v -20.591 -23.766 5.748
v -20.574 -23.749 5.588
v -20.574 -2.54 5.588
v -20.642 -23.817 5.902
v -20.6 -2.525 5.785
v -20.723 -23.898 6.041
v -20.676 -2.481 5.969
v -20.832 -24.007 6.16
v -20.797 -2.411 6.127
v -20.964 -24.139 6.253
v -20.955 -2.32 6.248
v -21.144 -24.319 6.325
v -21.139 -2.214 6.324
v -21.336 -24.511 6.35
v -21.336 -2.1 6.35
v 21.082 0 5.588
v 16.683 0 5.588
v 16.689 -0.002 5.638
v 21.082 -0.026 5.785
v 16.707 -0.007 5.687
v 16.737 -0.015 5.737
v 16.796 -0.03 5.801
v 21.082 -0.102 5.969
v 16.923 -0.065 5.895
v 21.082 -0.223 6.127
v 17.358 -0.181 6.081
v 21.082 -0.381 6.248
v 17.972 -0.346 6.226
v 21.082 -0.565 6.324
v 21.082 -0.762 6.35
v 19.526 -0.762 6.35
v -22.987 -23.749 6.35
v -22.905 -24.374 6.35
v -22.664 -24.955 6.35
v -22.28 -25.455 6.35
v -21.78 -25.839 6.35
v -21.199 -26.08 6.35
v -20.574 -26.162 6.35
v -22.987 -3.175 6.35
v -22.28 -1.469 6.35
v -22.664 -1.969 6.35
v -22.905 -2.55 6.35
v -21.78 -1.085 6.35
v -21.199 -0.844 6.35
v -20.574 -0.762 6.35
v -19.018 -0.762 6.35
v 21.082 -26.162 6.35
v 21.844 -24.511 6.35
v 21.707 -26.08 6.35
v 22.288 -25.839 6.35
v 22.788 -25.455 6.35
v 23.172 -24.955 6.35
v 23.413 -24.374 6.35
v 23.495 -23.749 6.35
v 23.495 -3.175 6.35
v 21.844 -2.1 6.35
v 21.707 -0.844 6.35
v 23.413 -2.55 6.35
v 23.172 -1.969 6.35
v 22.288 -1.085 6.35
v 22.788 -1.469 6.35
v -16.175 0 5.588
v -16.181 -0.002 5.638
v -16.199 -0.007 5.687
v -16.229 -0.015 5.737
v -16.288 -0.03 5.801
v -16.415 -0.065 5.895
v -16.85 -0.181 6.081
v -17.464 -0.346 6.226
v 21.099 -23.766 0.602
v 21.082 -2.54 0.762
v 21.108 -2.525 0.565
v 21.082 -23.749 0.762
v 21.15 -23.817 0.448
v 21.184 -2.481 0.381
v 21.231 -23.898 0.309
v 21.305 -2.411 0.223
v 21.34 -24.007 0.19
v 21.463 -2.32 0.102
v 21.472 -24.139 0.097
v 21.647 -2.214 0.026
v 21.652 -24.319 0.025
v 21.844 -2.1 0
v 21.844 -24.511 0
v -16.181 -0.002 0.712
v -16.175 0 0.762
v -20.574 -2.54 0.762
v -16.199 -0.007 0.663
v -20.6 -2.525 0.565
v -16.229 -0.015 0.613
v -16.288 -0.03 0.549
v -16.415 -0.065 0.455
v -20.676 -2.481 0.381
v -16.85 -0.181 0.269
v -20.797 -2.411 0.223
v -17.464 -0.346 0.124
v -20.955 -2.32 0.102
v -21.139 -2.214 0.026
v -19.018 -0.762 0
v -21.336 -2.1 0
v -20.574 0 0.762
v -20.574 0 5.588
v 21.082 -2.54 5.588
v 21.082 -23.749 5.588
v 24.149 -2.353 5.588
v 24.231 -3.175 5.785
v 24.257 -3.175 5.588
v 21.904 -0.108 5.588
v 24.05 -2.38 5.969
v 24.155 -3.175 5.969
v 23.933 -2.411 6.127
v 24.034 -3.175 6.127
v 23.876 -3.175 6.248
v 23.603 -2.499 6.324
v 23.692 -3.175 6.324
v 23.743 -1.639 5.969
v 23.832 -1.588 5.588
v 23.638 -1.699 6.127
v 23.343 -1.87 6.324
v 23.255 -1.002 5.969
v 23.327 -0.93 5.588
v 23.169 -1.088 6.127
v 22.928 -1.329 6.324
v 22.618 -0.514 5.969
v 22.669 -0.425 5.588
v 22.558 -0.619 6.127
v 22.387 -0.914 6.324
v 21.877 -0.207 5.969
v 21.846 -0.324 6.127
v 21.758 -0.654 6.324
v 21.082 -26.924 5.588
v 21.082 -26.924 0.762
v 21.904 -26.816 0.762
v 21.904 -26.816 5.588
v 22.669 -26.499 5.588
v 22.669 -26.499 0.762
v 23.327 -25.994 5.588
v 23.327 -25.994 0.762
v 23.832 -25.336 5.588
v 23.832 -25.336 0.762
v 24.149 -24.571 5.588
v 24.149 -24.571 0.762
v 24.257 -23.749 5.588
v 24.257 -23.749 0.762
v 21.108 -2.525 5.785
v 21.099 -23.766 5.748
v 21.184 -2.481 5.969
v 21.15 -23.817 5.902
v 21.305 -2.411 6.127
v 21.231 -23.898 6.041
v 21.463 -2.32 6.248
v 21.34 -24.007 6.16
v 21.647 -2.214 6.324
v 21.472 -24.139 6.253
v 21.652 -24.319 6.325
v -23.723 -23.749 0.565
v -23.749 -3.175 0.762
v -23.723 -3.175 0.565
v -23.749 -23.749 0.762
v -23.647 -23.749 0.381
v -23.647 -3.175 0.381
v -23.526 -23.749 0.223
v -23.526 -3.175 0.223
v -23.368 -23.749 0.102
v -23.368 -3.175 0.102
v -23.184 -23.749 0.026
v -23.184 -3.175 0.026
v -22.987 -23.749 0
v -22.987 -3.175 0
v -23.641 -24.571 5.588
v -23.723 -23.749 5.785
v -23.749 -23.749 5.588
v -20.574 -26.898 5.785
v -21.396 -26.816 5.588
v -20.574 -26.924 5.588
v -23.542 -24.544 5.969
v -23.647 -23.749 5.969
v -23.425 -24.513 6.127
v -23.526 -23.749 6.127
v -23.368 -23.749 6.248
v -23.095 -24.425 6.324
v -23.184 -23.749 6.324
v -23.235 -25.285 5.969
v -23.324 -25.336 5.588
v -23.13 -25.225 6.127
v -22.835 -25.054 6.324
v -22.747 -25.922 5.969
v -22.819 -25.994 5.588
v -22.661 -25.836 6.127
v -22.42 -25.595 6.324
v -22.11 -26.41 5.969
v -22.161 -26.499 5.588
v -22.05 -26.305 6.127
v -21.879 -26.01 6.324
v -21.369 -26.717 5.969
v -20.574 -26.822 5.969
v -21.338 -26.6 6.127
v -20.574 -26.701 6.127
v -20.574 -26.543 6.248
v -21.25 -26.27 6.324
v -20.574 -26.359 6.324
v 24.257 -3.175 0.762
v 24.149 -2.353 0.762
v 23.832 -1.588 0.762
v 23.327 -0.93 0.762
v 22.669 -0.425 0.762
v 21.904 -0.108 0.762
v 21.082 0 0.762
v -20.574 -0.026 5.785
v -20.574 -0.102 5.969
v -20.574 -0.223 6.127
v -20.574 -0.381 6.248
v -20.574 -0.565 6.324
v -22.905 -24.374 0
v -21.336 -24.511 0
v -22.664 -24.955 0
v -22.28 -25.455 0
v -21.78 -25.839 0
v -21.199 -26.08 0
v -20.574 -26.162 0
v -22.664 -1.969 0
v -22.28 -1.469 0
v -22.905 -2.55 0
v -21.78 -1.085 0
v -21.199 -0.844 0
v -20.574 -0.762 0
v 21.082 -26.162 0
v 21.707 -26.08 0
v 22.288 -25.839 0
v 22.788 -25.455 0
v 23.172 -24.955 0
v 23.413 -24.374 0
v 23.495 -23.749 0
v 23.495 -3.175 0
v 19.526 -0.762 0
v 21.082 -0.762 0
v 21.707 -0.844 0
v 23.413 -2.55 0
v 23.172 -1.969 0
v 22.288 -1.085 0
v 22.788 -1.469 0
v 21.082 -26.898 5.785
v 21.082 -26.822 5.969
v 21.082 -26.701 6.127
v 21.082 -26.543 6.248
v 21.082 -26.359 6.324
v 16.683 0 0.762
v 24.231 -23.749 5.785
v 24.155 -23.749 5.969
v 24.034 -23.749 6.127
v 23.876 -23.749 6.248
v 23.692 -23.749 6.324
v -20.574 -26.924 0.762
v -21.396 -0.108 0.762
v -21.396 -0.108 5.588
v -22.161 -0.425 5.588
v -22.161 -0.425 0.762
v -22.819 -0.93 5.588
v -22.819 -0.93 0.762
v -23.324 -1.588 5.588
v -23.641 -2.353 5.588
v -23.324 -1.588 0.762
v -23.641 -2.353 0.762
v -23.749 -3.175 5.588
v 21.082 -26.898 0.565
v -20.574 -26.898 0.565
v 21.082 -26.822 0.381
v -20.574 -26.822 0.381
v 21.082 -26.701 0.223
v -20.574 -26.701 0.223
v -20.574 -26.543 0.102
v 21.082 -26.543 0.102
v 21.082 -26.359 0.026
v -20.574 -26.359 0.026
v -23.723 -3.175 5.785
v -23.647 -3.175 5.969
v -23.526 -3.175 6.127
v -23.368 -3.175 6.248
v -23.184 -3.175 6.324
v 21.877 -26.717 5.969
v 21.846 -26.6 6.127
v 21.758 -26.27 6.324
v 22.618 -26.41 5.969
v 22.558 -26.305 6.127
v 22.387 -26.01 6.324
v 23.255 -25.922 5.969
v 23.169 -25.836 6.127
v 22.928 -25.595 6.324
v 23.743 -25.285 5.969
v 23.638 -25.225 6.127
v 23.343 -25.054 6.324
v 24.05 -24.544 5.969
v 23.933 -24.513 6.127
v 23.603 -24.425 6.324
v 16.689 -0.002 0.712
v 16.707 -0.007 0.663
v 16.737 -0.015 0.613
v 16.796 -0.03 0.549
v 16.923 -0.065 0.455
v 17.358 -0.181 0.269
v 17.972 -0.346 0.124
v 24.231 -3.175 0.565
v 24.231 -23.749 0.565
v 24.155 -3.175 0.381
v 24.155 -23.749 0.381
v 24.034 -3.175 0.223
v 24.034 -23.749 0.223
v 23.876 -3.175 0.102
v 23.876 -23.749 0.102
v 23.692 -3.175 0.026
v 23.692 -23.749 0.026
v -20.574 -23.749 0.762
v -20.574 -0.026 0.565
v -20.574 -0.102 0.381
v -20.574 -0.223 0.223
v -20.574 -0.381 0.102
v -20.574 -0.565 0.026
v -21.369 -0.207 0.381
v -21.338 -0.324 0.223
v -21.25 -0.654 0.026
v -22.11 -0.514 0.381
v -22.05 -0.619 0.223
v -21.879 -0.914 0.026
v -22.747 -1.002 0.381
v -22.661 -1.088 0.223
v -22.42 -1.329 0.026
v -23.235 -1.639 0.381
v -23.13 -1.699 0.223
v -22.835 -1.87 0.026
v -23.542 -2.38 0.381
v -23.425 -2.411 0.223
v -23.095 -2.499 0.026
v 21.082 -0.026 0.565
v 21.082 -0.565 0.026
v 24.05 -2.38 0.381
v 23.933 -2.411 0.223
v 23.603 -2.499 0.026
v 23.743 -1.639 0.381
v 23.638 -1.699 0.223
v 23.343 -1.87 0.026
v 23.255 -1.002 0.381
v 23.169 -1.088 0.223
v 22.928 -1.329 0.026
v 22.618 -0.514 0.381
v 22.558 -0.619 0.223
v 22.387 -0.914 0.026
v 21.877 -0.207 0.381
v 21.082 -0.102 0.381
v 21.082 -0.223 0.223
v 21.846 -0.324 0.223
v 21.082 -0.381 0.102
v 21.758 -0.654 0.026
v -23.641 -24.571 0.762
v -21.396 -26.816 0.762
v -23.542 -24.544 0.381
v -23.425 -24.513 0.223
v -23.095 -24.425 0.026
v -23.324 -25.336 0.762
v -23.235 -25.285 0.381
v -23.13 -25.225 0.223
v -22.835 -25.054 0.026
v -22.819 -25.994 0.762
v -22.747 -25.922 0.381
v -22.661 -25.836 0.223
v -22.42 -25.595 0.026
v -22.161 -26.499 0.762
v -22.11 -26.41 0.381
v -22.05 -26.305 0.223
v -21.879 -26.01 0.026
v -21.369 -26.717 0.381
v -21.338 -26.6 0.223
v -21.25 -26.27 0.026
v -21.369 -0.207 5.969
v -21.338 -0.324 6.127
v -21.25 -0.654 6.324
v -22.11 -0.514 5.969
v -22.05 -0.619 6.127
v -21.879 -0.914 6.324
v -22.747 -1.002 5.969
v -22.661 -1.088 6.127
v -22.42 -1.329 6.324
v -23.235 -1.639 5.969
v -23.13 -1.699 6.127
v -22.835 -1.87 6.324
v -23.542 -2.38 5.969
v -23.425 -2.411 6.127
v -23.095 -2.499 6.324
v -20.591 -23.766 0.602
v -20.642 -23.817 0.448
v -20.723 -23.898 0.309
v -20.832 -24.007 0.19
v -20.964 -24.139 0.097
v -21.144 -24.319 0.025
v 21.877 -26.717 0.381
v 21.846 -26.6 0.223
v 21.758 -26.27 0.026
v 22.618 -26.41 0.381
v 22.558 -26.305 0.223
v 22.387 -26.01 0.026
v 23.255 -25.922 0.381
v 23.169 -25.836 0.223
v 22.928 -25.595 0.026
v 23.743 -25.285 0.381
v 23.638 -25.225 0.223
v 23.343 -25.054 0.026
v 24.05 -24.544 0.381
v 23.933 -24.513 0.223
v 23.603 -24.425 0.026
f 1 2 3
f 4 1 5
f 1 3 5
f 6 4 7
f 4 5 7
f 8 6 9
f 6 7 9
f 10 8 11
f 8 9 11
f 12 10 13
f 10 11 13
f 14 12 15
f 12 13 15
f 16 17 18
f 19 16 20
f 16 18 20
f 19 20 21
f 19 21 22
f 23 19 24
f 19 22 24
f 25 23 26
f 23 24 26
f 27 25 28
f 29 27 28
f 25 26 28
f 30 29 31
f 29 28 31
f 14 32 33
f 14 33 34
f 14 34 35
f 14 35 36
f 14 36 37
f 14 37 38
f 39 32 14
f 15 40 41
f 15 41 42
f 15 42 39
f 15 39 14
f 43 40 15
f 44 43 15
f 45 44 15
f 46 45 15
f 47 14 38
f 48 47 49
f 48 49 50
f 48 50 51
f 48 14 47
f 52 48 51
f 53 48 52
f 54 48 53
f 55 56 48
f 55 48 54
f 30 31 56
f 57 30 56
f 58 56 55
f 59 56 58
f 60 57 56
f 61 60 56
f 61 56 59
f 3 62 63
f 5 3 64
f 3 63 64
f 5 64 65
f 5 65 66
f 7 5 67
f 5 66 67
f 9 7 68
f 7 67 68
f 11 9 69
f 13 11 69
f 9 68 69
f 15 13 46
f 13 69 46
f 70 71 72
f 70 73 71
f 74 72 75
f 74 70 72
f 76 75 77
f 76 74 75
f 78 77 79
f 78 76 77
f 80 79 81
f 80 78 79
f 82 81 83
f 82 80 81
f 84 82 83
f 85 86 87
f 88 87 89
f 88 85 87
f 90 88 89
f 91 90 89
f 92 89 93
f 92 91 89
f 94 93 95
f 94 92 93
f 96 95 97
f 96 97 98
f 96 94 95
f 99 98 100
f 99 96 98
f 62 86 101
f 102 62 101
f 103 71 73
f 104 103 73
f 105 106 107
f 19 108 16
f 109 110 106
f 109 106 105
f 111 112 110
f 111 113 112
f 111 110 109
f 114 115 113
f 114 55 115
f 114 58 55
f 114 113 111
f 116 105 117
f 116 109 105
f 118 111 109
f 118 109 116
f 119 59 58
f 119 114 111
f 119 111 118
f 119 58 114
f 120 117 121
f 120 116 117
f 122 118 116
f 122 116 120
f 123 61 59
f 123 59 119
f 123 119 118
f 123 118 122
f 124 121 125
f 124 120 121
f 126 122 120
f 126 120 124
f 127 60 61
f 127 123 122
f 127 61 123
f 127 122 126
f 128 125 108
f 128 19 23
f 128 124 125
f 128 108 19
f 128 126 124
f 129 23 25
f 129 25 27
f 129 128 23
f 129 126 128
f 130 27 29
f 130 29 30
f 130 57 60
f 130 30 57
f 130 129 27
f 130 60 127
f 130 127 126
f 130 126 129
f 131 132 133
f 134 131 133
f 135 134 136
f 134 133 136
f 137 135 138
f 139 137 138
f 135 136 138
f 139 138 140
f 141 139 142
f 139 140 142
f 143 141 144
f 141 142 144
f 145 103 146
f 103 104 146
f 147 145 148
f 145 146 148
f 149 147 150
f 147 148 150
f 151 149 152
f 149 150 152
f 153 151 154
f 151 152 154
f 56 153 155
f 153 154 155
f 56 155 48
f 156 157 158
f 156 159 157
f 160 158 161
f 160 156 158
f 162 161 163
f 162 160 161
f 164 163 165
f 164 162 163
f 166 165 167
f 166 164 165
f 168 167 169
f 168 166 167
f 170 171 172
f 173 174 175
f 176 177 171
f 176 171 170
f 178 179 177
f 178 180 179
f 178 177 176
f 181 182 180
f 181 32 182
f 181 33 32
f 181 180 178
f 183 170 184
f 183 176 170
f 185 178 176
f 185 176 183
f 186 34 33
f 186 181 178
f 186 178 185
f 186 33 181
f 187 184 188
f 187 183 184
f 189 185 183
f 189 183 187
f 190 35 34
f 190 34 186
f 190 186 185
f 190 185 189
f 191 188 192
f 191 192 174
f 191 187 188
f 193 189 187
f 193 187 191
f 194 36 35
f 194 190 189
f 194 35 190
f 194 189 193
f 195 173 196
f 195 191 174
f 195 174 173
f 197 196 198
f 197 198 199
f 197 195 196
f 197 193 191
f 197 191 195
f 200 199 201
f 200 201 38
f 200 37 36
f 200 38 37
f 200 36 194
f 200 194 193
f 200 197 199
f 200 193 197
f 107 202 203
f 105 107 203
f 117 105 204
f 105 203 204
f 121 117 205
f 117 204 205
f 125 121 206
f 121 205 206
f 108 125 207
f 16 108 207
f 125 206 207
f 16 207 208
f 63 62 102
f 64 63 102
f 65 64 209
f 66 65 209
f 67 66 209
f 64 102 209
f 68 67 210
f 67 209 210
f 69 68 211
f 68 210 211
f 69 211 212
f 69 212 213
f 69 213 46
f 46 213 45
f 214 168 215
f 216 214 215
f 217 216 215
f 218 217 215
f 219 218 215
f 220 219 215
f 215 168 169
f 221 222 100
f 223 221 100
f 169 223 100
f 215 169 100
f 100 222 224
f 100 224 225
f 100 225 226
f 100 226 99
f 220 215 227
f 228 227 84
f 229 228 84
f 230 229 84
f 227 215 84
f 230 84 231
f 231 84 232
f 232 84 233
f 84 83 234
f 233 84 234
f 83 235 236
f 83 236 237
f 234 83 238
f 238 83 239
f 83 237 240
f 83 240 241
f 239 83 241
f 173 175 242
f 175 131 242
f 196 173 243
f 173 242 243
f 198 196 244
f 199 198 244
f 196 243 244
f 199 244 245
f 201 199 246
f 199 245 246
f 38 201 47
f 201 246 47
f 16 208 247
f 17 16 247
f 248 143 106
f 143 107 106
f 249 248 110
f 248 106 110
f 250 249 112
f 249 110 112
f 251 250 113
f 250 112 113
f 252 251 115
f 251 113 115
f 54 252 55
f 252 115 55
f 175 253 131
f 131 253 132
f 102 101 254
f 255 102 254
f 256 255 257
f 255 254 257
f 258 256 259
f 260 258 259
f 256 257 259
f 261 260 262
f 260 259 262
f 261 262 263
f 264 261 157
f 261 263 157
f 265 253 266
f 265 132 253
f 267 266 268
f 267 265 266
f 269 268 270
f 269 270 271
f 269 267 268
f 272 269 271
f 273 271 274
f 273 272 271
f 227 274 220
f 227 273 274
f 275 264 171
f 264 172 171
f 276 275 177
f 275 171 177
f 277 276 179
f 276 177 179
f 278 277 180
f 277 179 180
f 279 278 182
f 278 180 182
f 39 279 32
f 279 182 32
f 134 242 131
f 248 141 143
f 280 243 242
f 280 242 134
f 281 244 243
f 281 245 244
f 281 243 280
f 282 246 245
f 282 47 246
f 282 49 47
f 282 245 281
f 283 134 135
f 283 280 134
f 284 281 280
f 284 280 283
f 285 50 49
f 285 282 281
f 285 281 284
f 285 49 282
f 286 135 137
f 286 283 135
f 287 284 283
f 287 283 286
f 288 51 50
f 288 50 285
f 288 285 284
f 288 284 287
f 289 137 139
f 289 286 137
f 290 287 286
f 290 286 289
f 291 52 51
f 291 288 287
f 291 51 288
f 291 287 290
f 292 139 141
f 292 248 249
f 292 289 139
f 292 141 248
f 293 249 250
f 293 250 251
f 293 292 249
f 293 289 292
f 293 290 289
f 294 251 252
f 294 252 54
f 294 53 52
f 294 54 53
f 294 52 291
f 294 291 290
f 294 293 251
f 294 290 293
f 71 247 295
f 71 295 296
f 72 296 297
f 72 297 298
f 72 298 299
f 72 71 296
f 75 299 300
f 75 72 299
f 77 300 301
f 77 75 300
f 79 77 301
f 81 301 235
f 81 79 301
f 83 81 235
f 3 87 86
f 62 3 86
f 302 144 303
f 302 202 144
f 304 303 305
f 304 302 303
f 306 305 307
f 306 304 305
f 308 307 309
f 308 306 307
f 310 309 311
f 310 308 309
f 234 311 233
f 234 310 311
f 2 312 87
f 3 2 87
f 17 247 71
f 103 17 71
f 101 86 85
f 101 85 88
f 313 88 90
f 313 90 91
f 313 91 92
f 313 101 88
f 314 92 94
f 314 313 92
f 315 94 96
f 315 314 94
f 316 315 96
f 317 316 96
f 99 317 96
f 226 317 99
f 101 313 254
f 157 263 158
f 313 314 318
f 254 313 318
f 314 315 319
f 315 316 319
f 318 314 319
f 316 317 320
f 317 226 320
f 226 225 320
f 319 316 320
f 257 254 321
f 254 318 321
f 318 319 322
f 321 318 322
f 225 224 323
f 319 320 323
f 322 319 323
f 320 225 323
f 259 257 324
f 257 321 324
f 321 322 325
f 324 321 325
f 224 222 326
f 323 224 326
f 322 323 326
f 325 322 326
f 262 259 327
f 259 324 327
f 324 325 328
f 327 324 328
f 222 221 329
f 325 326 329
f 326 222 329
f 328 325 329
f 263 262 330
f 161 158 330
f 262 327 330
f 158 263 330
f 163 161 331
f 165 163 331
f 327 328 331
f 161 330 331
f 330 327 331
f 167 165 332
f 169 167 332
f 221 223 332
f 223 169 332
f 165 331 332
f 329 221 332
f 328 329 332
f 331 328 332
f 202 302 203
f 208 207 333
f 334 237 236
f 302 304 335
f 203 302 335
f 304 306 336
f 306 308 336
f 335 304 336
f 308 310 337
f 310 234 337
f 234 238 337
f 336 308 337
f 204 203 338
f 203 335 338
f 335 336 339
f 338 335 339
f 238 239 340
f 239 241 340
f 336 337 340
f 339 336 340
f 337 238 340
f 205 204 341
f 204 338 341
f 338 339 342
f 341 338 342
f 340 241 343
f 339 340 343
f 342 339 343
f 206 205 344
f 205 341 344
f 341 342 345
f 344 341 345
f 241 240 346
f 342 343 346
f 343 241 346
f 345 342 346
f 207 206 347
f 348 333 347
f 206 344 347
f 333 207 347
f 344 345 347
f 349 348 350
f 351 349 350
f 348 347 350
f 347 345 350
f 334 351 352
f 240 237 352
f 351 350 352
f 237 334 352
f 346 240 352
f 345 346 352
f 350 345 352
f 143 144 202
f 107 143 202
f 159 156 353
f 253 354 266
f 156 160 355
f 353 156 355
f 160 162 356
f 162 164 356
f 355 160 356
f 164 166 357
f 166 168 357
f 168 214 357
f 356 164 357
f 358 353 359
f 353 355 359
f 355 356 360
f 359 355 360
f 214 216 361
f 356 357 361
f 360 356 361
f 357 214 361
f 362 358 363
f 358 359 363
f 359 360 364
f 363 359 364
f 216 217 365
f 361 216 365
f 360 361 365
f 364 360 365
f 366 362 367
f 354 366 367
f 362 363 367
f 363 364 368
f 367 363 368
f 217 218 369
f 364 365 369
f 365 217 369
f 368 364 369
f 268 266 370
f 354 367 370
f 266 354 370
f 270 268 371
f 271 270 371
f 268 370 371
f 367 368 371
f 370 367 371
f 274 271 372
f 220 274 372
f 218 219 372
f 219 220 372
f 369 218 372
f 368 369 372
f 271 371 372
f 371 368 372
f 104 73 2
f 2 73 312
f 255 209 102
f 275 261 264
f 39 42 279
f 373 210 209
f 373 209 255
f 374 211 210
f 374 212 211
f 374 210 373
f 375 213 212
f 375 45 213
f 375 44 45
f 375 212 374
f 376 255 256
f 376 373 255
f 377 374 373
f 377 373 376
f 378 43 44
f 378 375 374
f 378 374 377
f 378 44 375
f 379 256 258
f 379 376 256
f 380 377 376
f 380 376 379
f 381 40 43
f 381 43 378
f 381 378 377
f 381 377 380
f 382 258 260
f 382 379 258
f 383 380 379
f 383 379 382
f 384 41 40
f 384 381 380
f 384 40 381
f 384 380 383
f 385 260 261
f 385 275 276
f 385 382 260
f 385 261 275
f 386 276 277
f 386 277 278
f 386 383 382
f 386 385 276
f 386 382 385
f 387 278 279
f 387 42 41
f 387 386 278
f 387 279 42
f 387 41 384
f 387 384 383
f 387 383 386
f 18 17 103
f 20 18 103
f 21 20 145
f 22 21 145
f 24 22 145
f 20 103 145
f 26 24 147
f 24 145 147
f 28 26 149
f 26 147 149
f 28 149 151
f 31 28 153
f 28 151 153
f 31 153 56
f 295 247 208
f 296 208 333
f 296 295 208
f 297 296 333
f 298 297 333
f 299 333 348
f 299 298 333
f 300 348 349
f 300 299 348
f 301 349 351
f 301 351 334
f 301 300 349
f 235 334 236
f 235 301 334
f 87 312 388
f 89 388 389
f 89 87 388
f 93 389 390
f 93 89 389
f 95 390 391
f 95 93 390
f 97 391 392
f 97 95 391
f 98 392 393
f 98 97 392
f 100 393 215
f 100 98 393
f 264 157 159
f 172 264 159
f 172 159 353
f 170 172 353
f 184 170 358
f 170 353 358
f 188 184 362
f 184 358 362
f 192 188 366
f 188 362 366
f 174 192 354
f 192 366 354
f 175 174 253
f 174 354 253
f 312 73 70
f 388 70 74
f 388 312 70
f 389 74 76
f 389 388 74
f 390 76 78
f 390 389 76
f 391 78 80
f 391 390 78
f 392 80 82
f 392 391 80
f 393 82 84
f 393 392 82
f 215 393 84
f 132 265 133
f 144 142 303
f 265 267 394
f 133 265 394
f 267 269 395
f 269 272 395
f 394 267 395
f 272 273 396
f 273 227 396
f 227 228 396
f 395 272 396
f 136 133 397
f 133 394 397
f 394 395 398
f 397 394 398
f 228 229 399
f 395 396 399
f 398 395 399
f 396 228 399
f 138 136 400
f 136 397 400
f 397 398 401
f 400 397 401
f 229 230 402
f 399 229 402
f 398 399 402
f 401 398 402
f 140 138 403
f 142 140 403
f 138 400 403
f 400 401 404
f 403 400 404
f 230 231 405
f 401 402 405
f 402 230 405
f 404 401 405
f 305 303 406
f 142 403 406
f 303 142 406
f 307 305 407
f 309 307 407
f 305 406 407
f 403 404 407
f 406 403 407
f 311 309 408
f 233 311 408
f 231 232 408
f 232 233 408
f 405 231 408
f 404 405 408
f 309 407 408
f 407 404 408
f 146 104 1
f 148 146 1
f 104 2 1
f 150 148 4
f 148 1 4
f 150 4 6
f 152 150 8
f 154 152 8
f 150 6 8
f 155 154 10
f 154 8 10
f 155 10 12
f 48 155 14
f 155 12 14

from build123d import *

# Parameters (mm, degrees)
F1_DEPTH = 6.35
F2_R     = 0.762


with BuildPart() as f1:
    # F0 (on Top) → F1 (new body)
    with BuildSketch(Plane.XY):
        with BuildLine():
            Line((-20.574, -2.54), (-16.174591, 0))
            Line((-16.174591, 0), (-20.574, 0))
            ThreePointArc((-20.574, 0), (-22.819064, -0.929936), (-23.749, -3.175))
            Line((-23.749, -3.175), (-23.749, -23.749))
            ThreePointArc((-23.749, -23.749), (-22.819064, -25.994064), (-20.574, -26.924))
            Line((-20.574, -26.924), (21.082, -26.924))
            ThreePointArc((21.082, -26.924), (23.327064, -25.994064), (24.257, -23.749))
            Line((24.257, -23.749), (24.257, -3.175))
            ThreePointArc((24.257, -3.175), (23.327064, -0.929936), (21.082, 0))
            Line((21.082, 0), (16.682591, 0))
            Line((16.682591, 0), (21.082, -2.54))
            Line((21.082, -2.54), (21.082, -23.749))
            Line((21.082, -23.749), (-20.574, -23.749))
            Line((-20.574, -23.749), (-20.574, -2.54))
        make_face()
    extrude(amount=F1_DEPTH)

    # F2
    f2_edges = [f1.edges().sort_by_distance(p)[0] for p in [
        (-20.574, -13.1445, 6.35),
        (-18.374295, -1.27, 6.35),
        (-18.374295, 0, 6.35),
        (-22.819064, -0.929936, 6.35),
        (-23.749, -13.462, 6.35),
        (-22.819064, -25.994064, 6.35),
        (0.254, -26.924, 6.35),
        (23.327064, -25.994064, 6.35),
        (24.257, -13.462, 6.35),
        (23.327064, -0.929936, 6.35),
        (18.882295, 0, 6.35),
        (18.882295, -1.27, 6.35),
        (21.082, -13.1445, 6.35),
        (0.254, -23.749, 6.35),
        (-20.574, -13.1445, 0),
        (-18.374295, -1.27, 0),
        (-18.374295, 0, 0),
        (-22.819064, -0.929936, 0),
        (-23.749, -13.462, 0),
        (-22.819064, -25.994064, 0),
        (0.254, -26.924, 0),
        (23.327064, -25.994064, 0),
        (24.257, -13.462, 0),
        (23.327064, -0.929936, 0),
        (18.882295, 0, 0),
        (18.882295, -1.27, 0),
        (21.082, -13.1445, 0),
        (0.254, -23.749, 0),
    ]]
    fillet(f2_edges, radius=F2_R)


solid = f1.part
